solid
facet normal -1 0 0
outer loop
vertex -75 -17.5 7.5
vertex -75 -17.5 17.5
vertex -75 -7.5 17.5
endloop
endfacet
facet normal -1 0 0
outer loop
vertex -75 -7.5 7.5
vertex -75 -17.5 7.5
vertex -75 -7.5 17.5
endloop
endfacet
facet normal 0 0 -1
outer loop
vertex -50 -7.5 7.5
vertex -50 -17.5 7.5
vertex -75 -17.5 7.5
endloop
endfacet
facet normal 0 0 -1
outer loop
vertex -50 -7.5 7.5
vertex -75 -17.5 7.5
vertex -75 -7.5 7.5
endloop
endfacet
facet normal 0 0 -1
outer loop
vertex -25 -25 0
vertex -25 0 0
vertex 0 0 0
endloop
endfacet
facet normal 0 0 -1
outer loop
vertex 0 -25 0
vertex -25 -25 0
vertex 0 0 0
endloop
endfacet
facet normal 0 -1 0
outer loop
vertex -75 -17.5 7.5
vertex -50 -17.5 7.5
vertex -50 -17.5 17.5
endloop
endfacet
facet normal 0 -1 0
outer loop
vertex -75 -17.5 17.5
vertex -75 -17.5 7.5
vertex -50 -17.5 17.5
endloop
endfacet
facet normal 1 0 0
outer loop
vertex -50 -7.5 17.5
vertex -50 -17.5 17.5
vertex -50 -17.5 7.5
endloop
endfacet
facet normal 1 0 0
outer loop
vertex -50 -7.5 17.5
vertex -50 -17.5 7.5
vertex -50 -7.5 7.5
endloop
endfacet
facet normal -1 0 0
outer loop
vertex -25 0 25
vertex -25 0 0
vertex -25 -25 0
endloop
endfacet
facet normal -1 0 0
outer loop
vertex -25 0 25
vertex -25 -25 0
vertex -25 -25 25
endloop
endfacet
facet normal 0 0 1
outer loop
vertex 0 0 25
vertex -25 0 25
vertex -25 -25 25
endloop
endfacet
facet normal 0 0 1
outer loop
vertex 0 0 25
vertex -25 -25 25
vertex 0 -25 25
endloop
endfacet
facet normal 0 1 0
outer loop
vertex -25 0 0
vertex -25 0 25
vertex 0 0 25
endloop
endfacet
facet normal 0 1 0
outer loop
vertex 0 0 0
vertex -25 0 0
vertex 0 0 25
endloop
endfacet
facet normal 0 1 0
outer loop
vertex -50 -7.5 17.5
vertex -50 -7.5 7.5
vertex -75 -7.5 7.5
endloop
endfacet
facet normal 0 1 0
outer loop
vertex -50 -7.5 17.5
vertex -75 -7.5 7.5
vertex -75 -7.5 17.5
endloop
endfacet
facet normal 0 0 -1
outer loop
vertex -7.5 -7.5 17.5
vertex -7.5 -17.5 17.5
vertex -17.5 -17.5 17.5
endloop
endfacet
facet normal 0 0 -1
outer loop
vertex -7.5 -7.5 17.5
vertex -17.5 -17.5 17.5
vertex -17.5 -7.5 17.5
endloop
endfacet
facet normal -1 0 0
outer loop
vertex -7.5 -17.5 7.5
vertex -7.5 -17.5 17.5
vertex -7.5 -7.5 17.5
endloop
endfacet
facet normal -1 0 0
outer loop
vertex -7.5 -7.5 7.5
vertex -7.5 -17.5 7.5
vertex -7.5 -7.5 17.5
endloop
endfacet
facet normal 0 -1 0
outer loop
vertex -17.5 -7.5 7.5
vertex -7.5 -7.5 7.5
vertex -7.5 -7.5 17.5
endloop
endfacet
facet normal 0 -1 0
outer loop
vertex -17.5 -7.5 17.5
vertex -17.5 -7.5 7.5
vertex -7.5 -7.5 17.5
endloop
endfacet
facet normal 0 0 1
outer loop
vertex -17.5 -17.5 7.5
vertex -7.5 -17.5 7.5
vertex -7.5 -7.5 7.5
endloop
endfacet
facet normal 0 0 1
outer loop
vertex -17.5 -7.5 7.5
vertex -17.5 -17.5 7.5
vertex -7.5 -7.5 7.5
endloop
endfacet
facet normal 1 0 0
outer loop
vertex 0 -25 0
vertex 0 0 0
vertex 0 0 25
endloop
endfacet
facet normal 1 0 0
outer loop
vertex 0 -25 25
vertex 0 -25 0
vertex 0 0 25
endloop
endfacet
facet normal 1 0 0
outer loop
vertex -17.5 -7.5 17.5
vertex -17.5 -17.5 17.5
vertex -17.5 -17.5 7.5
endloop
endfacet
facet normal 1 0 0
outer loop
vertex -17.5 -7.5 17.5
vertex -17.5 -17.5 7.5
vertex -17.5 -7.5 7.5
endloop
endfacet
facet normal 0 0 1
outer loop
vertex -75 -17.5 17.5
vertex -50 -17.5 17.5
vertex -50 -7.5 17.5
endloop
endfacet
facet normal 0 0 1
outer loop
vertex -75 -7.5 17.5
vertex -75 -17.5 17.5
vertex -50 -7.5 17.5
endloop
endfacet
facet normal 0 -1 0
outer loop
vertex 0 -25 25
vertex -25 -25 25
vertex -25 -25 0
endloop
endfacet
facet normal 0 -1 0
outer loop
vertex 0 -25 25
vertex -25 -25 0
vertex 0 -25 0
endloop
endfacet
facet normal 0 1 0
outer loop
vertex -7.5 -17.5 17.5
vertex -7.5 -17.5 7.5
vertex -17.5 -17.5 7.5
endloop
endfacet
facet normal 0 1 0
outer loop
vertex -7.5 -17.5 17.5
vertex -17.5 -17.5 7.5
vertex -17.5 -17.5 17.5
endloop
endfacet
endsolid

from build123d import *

# Parameters (mm, degrees)
F0_W     = 25
F0_H     = 25
F1_DEPTH = 25
F4_START = -32.5
F3_W     = 10
F3_H     = 10
F4_DEPTH = 10
F5_START = -75
F5_DEPTH = 25


with BuildPart() as f1:
    # F0 (on Front) → F1 (new body)
    with BuildSketch(Plane.XZ):
        with Locations((-12.5, 12.5)):
            Rectangle(F0_W, F0_H)
    extrude(amount=F1_DEPTH)

    # F3 (on offset) → F4 (cut)
    with BuildSketch(Plane.YZ.offset(25).offset(F4_START)):
        with Locations((-12.5, 12.5)):
            Rectangle(F3_W, F3_H)
    extrude(amount=-F4_DEPTH, mode=Mode.SUBTRACT)


with BuildPart() as f5:
    # F3 (on offset) → F5 (new body)
    with BuildSketch(Plane.YZ.offset(25).offset(F5_START)):
        with Locations((-12.5, 12.5)):
            Rectangle(F3_W, F3_H)
    extrude(amount=-F5_DEPTH)


solid = Compound([f1.part, f5.part])
